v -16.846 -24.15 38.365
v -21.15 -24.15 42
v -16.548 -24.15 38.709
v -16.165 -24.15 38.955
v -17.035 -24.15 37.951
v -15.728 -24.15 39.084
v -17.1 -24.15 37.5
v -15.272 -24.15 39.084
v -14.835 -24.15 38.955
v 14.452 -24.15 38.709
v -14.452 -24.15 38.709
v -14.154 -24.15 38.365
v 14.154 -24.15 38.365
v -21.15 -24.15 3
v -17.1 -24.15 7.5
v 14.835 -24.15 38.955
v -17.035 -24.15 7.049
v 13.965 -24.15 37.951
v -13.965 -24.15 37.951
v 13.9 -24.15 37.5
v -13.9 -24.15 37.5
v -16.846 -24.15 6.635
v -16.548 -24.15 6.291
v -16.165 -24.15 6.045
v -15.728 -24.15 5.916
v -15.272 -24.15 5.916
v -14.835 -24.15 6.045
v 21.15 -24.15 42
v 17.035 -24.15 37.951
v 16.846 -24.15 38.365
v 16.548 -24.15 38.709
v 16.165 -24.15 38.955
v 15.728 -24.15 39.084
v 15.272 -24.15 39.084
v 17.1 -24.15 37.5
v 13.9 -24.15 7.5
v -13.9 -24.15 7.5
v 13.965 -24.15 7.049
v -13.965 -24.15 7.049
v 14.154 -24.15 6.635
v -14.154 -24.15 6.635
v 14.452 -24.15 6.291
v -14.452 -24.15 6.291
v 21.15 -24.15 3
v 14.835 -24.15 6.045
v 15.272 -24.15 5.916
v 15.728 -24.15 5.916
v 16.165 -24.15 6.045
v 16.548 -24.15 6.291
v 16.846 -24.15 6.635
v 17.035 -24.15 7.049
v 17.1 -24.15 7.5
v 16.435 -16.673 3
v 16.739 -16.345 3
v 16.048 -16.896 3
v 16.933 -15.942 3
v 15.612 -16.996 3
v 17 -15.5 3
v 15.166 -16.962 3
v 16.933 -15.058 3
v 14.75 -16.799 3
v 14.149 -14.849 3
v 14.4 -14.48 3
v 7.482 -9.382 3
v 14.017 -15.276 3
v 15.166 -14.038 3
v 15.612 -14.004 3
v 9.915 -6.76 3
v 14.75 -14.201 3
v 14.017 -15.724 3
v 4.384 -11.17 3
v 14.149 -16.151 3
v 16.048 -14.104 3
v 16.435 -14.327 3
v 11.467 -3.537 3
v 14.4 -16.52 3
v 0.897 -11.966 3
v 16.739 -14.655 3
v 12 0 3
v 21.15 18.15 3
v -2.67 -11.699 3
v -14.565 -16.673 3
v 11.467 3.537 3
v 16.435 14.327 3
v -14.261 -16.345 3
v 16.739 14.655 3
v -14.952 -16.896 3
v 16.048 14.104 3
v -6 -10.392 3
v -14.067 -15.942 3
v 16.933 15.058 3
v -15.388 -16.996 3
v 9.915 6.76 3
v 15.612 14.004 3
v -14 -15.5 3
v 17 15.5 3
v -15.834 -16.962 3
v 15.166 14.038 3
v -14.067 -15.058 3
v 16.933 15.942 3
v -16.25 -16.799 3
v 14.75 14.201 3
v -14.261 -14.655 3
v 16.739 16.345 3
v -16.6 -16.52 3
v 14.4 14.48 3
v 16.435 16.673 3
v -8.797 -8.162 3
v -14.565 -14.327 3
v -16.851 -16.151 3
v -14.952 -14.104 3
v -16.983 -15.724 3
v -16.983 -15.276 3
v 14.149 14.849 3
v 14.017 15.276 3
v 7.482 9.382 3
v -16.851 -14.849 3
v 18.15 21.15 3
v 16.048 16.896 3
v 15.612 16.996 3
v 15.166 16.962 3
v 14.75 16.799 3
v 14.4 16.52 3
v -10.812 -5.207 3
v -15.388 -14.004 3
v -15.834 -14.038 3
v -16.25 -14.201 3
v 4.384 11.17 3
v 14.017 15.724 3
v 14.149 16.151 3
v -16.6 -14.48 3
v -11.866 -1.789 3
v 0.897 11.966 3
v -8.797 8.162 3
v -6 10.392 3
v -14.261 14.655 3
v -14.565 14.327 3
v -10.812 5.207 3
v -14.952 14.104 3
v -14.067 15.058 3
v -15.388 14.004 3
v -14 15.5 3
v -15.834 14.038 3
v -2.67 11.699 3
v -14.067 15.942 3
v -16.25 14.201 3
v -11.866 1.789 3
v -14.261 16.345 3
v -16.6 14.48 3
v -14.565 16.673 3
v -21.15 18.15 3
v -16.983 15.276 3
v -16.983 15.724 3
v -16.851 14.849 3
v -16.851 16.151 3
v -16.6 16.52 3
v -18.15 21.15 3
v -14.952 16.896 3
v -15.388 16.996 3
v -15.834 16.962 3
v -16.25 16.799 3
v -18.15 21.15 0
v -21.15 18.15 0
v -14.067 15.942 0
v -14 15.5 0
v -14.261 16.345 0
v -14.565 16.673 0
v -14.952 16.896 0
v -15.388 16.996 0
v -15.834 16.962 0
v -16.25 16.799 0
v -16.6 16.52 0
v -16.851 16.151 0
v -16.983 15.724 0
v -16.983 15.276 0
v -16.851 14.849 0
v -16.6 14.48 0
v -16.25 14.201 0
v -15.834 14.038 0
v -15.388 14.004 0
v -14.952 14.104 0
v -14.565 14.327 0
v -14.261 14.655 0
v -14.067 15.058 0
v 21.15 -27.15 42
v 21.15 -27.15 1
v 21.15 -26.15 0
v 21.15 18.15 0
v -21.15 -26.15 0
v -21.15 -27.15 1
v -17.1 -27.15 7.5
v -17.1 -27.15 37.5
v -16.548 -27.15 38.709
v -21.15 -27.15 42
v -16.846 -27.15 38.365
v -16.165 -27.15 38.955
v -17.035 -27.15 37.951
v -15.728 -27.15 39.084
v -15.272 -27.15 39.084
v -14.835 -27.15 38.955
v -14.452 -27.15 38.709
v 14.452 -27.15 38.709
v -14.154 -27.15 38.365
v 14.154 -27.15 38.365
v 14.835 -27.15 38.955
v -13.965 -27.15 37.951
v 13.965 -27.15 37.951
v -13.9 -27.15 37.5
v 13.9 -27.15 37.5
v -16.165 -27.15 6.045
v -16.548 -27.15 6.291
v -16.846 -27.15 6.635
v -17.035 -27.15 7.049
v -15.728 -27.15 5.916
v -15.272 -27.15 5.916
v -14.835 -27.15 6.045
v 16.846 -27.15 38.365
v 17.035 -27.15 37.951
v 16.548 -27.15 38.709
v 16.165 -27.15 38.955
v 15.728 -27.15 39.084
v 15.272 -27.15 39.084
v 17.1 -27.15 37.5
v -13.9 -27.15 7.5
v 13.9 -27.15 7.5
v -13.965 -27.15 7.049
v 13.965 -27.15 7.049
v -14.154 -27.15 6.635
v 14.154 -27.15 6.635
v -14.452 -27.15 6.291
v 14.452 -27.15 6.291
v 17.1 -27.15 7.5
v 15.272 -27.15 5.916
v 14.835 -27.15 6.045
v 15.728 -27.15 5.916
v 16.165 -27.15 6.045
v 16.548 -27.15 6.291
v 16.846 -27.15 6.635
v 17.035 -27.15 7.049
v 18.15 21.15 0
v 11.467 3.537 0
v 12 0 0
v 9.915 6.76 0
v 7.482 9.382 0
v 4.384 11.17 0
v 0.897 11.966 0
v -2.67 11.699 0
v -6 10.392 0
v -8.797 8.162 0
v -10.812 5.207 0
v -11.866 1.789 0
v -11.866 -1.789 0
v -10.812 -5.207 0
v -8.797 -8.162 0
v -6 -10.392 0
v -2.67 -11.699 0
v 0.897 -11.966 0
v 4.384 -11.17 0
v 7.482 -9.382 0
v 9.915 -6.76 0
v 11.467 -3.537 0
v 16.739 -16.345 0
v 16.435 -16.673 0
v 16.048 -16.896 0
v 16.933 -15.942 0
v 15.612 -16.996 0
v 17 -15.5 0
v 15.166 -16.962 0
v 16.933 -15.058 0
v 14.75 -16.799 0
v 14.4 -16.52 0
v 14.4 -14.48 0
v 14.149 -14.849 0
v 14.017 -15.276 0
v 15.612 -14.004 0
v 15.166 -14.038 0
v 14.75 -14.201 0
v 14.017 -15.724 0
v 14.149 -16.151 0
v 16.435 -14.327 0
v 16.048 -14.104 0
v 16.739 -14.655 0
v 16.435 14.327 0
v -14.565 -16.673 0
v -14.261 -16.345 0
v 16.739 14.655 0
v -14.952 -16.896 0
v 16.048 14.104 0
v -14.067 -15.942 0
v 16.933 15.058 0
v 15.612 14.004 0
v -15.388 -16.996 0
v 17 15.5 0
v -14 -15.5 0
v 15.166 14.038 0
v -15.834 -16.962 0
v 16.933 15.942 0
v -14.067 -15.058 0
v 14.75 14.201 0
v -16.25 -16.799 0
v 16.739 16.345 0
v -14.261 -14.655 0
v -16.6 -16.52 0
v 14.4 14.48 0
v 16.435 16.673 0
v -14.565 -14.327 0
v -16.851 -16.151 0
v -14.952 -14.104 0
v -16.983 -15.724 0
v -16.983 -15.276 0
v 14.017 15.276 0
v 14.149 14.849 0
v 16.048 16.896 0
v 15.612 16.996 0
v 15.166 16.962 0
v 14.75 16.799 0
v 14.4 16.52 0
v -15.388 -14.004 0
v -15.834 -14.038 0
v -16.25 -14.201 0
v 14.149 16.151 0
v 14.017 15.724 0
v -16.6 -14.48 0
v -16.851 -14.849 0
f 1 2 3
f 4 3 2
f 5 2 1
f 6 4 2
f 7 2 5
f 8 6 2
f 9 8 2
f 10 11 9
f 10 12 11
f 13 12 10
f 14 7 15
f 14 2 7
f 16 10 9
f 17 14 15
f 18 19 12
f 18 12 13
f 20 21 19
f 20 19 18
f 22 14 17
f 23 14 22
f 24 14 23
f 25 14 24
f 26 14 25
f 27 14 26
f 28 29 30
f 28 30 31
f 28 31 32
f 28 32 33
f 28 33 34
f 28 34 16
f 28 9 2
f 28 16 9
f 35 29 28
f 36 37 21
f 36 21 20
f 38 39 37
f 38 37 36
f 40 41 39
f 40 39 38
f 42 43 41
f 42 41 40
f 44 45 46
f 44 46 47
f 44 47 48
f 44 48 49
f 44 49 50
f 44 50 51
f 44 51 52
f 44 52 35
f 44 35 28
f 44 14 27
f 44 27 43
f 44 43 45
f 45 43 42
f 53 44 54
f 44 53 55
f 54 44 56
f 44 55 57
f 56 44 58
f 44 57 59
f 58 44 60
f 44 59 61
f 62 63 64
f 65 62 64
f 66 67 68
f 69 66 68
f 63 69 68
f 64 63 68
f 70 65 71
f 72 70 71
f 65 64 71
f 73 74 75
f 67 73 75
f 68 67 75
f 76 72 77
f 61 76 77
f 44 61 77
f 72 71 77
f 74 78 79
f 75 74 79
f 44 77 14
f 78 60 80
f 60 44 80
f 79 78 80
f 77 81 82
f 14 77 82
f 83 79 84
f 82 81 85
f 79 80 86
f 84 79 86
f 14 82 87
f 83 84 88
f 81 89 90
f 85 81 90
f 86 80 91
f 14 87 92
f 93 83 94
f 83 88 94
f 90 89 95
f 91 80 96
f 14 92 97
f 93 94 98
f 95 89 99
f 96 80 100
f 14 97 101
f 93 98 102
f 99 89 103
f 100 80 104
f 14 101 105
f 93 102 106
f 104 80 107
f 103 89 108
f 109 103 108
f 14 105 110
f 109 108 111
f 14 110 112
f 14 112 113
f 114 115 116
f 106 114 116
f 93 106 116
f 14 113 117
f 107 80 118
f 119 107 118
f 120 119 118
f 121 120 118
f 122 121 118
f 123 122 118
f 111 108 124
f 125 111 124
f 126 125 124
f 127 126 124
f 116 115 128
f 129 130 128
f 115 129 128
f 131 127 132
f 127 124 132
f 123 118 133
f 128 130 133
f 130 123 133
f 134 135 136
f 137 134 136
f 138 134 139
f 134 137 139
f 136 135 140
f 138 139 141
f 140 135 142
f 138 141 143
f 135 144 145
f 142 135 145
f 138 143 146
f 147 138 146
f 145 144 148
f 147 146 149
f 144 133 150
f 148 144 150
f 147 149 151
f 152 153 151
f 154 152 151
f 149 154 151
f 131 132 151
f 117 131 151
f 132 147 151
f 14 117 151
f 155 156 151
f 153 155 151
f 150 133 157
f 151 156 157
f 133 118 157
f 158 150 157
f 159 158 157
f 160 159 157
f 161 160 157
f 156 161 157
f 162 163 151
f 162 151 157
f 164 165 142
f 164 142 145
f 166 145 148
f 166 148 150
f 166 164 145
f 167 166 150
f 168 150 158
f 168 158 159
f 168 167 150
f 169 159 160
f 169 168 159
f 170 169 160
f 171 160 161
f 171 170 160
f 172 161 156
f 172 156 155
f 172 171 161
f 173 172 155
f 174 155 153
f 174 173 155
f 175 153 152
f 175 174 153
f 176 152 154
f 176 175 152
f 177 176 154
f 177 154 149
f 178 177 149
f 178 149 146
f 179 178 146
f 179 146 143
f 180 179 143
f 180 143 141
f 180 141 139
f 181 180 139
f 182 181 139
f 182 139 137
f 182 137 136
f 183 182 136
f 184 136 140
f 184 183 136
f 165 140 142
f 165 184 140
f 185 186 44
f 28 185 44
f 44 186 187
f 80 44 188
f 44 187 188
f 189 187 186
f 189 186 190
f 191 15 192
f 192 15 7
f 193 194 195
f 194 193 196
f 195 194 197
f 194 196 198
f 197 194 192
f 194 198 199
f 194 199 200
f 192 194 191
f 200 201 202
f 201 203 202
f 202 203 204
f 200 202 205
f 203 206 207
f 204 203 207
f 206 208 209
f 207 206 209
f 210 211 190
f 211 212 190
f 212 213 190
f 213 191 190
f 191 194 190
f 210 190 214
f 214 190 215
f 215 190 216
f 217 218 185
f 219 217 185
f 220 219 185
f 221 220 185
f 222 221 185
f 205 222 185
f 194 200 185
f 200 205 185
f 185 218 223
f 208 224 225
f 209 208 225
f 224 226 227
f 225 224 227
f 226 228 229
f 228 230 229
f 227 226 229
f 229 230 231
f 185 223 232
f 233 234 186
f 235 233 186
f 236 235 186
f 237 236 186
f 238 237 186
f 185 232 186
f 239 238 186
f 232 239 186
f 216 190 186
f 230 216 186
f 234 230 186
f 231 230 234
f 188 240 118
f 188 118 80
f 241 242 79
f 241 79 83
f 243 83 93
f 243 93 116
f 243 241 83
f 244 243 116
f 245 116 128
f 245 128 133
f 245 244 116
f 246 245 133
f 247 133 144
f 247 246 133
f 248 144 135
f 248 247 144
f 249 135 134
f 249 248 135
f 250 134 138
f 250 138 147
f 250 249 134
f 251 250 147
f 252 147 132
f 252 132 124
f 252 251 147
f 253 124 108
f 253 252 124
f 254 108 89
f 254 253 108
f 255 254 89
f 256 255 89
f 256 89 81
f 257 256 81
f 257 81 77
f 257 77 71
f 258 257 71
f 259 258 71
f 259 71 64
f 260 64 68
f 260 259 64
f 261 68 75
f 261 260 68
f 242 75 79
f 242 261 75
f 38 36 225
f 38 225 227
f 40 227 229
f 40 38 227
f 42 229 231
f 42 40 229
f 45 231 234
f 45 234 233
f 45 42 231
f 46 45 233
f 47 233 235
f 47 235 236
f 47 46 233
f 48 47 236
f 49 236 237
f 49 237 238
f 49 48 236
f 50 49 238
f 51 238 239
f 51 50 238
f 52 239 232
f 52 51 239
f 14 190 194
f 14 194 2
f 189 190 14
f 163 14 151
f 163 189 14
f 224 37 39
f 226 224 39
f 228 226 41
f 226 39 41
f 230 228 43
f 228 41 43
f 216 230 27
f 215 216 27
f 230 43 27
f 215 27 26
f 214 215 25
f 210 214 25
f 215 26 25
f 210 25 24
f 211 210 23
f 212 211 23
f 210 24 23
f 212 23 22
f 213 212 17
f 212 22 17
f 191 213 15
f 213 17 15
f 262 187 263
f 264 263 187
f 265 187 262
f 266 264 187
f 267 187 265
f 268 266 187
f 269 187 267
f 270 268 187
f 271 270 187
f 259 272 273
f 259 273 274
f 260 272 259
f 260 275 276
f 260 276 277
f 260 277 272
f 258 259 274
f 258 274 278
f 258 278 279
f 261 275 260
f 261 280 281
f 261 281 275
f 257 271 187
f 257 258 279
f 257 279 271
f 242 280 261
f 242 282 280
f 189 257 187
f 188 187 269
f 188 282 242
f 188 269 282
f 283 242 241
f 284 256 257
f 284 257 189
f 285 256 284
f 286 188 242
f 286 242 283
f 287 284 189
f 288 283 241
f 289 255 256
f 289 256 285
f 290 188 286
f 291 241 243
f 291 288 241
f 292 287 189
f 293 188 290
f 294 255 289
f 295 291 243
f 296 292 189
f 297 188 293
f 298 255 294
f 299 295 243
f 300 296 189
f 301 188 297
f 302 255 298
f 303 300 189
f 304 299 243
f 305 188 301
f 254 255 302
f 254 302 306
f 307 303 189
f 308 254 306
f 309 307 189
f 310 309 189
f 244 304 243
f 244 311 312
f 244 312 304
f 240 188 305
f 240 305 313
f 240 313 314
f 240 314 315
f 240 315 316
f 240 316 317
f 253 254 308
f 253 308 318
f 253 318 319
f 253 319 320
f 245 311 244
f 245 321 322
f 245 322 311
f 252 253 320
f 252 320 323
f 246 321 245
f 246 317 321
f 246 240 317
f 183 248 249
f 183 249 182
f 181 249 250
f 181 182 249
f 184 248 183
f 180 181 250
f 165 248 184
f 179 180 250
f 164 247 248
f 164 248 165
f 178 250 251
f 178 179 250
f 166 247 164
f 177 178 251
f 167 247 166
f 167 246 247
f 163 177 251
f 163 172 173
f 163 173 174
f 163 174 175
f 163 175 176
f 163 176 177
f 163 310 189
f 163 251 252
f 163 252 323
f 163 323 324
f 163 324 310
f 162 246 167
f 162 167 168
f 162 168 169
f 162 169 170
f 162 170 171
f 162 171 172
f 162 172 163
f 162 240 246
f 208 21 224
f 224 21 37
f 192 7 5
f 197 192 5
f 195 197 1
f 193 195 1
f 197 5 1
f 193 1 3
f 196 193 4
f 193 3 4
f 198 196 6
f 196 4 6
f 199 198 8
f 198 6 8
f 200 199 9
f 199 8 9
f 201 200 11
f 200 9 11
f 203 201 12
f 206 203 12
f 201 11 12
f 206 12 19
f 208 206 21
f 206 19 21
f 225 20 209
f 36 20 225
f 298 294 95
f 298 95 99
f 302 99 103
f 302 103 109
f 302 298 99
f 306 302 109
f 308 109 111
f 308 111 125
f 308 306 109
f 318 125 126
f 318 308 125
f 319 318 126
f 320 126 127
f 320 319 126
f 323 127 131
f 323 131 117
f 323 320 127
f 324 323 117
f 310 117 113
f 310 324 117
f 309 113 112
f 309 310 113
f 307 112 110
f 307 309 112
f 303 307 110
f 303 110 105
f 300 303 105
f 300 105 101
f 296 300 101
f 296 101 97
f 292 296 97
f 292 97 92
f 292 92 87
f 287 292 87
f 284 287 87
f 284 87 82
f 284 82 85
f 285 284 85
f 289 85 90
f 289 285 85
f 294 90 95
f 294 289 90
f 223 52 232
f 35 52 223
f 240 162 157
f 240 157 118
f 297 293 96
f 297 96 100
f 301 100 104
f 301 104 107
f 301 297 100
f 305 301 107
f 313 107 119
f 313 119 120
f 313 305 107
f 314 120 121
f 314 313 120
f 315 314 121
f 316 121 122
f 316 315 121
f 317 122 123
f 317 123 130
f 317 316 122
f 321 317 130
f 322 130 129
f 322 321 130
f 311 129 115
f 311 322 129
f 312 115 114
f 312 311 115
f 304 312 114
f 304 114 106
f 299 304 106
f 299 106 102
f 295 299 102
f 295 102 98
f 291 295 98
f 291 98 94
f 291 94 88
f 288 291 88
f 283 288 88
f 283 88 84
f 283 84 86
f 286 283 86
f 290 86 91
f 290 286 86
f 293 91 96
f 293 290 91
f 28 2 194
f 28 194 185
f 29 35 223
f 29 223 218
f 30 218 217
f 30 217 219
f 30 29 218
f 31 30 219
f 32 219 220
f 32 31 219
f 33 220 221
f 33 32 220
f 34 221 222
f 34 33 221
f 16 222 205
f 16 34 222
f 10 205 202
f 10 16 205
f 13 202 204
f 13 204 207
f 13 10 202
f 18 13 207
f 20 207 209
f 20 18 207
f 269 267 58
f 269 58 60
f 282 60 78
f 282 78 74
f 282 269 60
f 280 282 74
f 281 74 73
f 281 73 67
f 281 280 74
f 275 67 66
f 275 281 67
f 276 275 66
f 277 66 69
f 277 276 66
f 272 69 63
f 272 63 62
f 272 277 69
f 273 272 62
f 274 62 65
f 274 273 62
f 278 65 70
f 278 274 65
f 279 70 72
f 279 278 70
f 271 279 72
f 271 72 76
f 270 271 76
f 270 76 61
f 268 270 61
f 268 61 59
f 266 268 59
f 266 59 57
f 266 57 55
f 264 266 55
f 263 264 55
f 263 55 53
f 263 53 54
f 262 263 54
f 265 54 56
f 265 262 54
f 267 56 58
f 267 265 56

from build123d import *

# Parameters (mm, degrees)
SKETCH1_R           = 1.5
SKETCH1_R_2         = 12
BOSS_EXTRUDE1_DEPTH = 3
BOSS_EXTRUDE2_DEPTH = 3
SKETCH3_W           = 42.3
SKETCH3_H           = 3
BOSS_EXTRUDE3_DEPTH = 39
CHAMFER1_SIZE       = 1
CUT_EXTRUDE1_DEPTH  = 3


with BuildPart() as part:
    # Sketch1 → Boss-Extrude1 (new body)
    with BuildSketch(Plane.XY):
        Polygon((-21.15, 18.15), (-18.15, 21.15), (18.15, 21.15), (21.15, 18.15), (21.15, -18.15), (18.15, -21.15), (-18.15, -21.15), (-21.15, -18.15), align=None)
        with Locations((-15.5, 15.5)):
            Circle(SKETCH1_R, mode=Mode.SUBTRACT)
        with Locations((15.5, 15.5)):
            Circle(SKETCH1_R, mode=Mode.SUBTRACT)
        with Locations((15.5, -15.5)):
            Circle(SKETCH1_R, mode=Mode.SUBTRACT)
        with Locations((-15.5, -15.5)):
            Circle(SKETCH1_R, mode=Mode.SUBTRACT)
        Circle(SKETCH1_R_2, mode=Mode.SUBTRACT)
    extrude(amount=BOSS_EXTRUDE1_DEPTH)

    # Sketch2 → Boss-Extrude2 (add)
    with BuildSketch(Plane(origin=(0, 0, 0), x_dir=(-1, 0, 0), z_dir=(0, 0, -1))):
        Polygon((21.15, -18.15), (18.15, -21.15), (-18.15, -21.15), (-21.15, -18.15), (-21.15, -27.15), (21.15, -27.15), align=None)
    extrude(amount=-BOSS_EXTRUDE2_DEPTH)

    # Sketch3 → Boss-Extrude3 (add)
    with BuildSketch(Plane.XY.offset(3)):
        with Locations((0, -25.65)):
            Rectangle(SKETCH3_W, SKETCH3_H)
    extrude(amount=BOSS_EXTRUDE3_DEPTH)

    # Chamfer1
    chamfer1_edges = [part.edges().sort_by_distance(p)[0] for p in [
        (0, -27.15, 0),
    ]]
    chamfer(chamfer1_edges, length=CHAMFER1_SIZE)

    # Sketch4 → Cut-Extrude1 (cut)
    with BuildSketch(Plane(origin=(0, -24.15, 0), x_dir=(1, 0, 0), z_dir=(0, 1, 0))):
        with BuildLine():
            Line((17.1, -7.5), (17.1, -37.5))
            ThreePointArc((17.1, -37.5), (15.5, -39.1), (13.9, -37.5))
            Line((13.9, -37.5), (13.9, -7.5))
            ThreePointArc((13.9, -7.5), (15.5, -5.9), (17.1, -7.5))
        make_face()
        with BuildLine():
            Line((-17.1, -7.5), (-17.1, -37.5))
            ThreePointArc((-17.1, -37.5), (-15.5, -39.1), (-13.9, -37.5))
            Line((-13.9, -37.5), (-13.9, -7.5))
            ThreePointArc((-13.9, -7.5), (-15.5, -5.9), (-17.1, -7.5))
        make_face()
    extrude(amount=-CUT_EXTRUDE1_DEPTH, mode=Mode.SUBTRACT)


solid = part.part
